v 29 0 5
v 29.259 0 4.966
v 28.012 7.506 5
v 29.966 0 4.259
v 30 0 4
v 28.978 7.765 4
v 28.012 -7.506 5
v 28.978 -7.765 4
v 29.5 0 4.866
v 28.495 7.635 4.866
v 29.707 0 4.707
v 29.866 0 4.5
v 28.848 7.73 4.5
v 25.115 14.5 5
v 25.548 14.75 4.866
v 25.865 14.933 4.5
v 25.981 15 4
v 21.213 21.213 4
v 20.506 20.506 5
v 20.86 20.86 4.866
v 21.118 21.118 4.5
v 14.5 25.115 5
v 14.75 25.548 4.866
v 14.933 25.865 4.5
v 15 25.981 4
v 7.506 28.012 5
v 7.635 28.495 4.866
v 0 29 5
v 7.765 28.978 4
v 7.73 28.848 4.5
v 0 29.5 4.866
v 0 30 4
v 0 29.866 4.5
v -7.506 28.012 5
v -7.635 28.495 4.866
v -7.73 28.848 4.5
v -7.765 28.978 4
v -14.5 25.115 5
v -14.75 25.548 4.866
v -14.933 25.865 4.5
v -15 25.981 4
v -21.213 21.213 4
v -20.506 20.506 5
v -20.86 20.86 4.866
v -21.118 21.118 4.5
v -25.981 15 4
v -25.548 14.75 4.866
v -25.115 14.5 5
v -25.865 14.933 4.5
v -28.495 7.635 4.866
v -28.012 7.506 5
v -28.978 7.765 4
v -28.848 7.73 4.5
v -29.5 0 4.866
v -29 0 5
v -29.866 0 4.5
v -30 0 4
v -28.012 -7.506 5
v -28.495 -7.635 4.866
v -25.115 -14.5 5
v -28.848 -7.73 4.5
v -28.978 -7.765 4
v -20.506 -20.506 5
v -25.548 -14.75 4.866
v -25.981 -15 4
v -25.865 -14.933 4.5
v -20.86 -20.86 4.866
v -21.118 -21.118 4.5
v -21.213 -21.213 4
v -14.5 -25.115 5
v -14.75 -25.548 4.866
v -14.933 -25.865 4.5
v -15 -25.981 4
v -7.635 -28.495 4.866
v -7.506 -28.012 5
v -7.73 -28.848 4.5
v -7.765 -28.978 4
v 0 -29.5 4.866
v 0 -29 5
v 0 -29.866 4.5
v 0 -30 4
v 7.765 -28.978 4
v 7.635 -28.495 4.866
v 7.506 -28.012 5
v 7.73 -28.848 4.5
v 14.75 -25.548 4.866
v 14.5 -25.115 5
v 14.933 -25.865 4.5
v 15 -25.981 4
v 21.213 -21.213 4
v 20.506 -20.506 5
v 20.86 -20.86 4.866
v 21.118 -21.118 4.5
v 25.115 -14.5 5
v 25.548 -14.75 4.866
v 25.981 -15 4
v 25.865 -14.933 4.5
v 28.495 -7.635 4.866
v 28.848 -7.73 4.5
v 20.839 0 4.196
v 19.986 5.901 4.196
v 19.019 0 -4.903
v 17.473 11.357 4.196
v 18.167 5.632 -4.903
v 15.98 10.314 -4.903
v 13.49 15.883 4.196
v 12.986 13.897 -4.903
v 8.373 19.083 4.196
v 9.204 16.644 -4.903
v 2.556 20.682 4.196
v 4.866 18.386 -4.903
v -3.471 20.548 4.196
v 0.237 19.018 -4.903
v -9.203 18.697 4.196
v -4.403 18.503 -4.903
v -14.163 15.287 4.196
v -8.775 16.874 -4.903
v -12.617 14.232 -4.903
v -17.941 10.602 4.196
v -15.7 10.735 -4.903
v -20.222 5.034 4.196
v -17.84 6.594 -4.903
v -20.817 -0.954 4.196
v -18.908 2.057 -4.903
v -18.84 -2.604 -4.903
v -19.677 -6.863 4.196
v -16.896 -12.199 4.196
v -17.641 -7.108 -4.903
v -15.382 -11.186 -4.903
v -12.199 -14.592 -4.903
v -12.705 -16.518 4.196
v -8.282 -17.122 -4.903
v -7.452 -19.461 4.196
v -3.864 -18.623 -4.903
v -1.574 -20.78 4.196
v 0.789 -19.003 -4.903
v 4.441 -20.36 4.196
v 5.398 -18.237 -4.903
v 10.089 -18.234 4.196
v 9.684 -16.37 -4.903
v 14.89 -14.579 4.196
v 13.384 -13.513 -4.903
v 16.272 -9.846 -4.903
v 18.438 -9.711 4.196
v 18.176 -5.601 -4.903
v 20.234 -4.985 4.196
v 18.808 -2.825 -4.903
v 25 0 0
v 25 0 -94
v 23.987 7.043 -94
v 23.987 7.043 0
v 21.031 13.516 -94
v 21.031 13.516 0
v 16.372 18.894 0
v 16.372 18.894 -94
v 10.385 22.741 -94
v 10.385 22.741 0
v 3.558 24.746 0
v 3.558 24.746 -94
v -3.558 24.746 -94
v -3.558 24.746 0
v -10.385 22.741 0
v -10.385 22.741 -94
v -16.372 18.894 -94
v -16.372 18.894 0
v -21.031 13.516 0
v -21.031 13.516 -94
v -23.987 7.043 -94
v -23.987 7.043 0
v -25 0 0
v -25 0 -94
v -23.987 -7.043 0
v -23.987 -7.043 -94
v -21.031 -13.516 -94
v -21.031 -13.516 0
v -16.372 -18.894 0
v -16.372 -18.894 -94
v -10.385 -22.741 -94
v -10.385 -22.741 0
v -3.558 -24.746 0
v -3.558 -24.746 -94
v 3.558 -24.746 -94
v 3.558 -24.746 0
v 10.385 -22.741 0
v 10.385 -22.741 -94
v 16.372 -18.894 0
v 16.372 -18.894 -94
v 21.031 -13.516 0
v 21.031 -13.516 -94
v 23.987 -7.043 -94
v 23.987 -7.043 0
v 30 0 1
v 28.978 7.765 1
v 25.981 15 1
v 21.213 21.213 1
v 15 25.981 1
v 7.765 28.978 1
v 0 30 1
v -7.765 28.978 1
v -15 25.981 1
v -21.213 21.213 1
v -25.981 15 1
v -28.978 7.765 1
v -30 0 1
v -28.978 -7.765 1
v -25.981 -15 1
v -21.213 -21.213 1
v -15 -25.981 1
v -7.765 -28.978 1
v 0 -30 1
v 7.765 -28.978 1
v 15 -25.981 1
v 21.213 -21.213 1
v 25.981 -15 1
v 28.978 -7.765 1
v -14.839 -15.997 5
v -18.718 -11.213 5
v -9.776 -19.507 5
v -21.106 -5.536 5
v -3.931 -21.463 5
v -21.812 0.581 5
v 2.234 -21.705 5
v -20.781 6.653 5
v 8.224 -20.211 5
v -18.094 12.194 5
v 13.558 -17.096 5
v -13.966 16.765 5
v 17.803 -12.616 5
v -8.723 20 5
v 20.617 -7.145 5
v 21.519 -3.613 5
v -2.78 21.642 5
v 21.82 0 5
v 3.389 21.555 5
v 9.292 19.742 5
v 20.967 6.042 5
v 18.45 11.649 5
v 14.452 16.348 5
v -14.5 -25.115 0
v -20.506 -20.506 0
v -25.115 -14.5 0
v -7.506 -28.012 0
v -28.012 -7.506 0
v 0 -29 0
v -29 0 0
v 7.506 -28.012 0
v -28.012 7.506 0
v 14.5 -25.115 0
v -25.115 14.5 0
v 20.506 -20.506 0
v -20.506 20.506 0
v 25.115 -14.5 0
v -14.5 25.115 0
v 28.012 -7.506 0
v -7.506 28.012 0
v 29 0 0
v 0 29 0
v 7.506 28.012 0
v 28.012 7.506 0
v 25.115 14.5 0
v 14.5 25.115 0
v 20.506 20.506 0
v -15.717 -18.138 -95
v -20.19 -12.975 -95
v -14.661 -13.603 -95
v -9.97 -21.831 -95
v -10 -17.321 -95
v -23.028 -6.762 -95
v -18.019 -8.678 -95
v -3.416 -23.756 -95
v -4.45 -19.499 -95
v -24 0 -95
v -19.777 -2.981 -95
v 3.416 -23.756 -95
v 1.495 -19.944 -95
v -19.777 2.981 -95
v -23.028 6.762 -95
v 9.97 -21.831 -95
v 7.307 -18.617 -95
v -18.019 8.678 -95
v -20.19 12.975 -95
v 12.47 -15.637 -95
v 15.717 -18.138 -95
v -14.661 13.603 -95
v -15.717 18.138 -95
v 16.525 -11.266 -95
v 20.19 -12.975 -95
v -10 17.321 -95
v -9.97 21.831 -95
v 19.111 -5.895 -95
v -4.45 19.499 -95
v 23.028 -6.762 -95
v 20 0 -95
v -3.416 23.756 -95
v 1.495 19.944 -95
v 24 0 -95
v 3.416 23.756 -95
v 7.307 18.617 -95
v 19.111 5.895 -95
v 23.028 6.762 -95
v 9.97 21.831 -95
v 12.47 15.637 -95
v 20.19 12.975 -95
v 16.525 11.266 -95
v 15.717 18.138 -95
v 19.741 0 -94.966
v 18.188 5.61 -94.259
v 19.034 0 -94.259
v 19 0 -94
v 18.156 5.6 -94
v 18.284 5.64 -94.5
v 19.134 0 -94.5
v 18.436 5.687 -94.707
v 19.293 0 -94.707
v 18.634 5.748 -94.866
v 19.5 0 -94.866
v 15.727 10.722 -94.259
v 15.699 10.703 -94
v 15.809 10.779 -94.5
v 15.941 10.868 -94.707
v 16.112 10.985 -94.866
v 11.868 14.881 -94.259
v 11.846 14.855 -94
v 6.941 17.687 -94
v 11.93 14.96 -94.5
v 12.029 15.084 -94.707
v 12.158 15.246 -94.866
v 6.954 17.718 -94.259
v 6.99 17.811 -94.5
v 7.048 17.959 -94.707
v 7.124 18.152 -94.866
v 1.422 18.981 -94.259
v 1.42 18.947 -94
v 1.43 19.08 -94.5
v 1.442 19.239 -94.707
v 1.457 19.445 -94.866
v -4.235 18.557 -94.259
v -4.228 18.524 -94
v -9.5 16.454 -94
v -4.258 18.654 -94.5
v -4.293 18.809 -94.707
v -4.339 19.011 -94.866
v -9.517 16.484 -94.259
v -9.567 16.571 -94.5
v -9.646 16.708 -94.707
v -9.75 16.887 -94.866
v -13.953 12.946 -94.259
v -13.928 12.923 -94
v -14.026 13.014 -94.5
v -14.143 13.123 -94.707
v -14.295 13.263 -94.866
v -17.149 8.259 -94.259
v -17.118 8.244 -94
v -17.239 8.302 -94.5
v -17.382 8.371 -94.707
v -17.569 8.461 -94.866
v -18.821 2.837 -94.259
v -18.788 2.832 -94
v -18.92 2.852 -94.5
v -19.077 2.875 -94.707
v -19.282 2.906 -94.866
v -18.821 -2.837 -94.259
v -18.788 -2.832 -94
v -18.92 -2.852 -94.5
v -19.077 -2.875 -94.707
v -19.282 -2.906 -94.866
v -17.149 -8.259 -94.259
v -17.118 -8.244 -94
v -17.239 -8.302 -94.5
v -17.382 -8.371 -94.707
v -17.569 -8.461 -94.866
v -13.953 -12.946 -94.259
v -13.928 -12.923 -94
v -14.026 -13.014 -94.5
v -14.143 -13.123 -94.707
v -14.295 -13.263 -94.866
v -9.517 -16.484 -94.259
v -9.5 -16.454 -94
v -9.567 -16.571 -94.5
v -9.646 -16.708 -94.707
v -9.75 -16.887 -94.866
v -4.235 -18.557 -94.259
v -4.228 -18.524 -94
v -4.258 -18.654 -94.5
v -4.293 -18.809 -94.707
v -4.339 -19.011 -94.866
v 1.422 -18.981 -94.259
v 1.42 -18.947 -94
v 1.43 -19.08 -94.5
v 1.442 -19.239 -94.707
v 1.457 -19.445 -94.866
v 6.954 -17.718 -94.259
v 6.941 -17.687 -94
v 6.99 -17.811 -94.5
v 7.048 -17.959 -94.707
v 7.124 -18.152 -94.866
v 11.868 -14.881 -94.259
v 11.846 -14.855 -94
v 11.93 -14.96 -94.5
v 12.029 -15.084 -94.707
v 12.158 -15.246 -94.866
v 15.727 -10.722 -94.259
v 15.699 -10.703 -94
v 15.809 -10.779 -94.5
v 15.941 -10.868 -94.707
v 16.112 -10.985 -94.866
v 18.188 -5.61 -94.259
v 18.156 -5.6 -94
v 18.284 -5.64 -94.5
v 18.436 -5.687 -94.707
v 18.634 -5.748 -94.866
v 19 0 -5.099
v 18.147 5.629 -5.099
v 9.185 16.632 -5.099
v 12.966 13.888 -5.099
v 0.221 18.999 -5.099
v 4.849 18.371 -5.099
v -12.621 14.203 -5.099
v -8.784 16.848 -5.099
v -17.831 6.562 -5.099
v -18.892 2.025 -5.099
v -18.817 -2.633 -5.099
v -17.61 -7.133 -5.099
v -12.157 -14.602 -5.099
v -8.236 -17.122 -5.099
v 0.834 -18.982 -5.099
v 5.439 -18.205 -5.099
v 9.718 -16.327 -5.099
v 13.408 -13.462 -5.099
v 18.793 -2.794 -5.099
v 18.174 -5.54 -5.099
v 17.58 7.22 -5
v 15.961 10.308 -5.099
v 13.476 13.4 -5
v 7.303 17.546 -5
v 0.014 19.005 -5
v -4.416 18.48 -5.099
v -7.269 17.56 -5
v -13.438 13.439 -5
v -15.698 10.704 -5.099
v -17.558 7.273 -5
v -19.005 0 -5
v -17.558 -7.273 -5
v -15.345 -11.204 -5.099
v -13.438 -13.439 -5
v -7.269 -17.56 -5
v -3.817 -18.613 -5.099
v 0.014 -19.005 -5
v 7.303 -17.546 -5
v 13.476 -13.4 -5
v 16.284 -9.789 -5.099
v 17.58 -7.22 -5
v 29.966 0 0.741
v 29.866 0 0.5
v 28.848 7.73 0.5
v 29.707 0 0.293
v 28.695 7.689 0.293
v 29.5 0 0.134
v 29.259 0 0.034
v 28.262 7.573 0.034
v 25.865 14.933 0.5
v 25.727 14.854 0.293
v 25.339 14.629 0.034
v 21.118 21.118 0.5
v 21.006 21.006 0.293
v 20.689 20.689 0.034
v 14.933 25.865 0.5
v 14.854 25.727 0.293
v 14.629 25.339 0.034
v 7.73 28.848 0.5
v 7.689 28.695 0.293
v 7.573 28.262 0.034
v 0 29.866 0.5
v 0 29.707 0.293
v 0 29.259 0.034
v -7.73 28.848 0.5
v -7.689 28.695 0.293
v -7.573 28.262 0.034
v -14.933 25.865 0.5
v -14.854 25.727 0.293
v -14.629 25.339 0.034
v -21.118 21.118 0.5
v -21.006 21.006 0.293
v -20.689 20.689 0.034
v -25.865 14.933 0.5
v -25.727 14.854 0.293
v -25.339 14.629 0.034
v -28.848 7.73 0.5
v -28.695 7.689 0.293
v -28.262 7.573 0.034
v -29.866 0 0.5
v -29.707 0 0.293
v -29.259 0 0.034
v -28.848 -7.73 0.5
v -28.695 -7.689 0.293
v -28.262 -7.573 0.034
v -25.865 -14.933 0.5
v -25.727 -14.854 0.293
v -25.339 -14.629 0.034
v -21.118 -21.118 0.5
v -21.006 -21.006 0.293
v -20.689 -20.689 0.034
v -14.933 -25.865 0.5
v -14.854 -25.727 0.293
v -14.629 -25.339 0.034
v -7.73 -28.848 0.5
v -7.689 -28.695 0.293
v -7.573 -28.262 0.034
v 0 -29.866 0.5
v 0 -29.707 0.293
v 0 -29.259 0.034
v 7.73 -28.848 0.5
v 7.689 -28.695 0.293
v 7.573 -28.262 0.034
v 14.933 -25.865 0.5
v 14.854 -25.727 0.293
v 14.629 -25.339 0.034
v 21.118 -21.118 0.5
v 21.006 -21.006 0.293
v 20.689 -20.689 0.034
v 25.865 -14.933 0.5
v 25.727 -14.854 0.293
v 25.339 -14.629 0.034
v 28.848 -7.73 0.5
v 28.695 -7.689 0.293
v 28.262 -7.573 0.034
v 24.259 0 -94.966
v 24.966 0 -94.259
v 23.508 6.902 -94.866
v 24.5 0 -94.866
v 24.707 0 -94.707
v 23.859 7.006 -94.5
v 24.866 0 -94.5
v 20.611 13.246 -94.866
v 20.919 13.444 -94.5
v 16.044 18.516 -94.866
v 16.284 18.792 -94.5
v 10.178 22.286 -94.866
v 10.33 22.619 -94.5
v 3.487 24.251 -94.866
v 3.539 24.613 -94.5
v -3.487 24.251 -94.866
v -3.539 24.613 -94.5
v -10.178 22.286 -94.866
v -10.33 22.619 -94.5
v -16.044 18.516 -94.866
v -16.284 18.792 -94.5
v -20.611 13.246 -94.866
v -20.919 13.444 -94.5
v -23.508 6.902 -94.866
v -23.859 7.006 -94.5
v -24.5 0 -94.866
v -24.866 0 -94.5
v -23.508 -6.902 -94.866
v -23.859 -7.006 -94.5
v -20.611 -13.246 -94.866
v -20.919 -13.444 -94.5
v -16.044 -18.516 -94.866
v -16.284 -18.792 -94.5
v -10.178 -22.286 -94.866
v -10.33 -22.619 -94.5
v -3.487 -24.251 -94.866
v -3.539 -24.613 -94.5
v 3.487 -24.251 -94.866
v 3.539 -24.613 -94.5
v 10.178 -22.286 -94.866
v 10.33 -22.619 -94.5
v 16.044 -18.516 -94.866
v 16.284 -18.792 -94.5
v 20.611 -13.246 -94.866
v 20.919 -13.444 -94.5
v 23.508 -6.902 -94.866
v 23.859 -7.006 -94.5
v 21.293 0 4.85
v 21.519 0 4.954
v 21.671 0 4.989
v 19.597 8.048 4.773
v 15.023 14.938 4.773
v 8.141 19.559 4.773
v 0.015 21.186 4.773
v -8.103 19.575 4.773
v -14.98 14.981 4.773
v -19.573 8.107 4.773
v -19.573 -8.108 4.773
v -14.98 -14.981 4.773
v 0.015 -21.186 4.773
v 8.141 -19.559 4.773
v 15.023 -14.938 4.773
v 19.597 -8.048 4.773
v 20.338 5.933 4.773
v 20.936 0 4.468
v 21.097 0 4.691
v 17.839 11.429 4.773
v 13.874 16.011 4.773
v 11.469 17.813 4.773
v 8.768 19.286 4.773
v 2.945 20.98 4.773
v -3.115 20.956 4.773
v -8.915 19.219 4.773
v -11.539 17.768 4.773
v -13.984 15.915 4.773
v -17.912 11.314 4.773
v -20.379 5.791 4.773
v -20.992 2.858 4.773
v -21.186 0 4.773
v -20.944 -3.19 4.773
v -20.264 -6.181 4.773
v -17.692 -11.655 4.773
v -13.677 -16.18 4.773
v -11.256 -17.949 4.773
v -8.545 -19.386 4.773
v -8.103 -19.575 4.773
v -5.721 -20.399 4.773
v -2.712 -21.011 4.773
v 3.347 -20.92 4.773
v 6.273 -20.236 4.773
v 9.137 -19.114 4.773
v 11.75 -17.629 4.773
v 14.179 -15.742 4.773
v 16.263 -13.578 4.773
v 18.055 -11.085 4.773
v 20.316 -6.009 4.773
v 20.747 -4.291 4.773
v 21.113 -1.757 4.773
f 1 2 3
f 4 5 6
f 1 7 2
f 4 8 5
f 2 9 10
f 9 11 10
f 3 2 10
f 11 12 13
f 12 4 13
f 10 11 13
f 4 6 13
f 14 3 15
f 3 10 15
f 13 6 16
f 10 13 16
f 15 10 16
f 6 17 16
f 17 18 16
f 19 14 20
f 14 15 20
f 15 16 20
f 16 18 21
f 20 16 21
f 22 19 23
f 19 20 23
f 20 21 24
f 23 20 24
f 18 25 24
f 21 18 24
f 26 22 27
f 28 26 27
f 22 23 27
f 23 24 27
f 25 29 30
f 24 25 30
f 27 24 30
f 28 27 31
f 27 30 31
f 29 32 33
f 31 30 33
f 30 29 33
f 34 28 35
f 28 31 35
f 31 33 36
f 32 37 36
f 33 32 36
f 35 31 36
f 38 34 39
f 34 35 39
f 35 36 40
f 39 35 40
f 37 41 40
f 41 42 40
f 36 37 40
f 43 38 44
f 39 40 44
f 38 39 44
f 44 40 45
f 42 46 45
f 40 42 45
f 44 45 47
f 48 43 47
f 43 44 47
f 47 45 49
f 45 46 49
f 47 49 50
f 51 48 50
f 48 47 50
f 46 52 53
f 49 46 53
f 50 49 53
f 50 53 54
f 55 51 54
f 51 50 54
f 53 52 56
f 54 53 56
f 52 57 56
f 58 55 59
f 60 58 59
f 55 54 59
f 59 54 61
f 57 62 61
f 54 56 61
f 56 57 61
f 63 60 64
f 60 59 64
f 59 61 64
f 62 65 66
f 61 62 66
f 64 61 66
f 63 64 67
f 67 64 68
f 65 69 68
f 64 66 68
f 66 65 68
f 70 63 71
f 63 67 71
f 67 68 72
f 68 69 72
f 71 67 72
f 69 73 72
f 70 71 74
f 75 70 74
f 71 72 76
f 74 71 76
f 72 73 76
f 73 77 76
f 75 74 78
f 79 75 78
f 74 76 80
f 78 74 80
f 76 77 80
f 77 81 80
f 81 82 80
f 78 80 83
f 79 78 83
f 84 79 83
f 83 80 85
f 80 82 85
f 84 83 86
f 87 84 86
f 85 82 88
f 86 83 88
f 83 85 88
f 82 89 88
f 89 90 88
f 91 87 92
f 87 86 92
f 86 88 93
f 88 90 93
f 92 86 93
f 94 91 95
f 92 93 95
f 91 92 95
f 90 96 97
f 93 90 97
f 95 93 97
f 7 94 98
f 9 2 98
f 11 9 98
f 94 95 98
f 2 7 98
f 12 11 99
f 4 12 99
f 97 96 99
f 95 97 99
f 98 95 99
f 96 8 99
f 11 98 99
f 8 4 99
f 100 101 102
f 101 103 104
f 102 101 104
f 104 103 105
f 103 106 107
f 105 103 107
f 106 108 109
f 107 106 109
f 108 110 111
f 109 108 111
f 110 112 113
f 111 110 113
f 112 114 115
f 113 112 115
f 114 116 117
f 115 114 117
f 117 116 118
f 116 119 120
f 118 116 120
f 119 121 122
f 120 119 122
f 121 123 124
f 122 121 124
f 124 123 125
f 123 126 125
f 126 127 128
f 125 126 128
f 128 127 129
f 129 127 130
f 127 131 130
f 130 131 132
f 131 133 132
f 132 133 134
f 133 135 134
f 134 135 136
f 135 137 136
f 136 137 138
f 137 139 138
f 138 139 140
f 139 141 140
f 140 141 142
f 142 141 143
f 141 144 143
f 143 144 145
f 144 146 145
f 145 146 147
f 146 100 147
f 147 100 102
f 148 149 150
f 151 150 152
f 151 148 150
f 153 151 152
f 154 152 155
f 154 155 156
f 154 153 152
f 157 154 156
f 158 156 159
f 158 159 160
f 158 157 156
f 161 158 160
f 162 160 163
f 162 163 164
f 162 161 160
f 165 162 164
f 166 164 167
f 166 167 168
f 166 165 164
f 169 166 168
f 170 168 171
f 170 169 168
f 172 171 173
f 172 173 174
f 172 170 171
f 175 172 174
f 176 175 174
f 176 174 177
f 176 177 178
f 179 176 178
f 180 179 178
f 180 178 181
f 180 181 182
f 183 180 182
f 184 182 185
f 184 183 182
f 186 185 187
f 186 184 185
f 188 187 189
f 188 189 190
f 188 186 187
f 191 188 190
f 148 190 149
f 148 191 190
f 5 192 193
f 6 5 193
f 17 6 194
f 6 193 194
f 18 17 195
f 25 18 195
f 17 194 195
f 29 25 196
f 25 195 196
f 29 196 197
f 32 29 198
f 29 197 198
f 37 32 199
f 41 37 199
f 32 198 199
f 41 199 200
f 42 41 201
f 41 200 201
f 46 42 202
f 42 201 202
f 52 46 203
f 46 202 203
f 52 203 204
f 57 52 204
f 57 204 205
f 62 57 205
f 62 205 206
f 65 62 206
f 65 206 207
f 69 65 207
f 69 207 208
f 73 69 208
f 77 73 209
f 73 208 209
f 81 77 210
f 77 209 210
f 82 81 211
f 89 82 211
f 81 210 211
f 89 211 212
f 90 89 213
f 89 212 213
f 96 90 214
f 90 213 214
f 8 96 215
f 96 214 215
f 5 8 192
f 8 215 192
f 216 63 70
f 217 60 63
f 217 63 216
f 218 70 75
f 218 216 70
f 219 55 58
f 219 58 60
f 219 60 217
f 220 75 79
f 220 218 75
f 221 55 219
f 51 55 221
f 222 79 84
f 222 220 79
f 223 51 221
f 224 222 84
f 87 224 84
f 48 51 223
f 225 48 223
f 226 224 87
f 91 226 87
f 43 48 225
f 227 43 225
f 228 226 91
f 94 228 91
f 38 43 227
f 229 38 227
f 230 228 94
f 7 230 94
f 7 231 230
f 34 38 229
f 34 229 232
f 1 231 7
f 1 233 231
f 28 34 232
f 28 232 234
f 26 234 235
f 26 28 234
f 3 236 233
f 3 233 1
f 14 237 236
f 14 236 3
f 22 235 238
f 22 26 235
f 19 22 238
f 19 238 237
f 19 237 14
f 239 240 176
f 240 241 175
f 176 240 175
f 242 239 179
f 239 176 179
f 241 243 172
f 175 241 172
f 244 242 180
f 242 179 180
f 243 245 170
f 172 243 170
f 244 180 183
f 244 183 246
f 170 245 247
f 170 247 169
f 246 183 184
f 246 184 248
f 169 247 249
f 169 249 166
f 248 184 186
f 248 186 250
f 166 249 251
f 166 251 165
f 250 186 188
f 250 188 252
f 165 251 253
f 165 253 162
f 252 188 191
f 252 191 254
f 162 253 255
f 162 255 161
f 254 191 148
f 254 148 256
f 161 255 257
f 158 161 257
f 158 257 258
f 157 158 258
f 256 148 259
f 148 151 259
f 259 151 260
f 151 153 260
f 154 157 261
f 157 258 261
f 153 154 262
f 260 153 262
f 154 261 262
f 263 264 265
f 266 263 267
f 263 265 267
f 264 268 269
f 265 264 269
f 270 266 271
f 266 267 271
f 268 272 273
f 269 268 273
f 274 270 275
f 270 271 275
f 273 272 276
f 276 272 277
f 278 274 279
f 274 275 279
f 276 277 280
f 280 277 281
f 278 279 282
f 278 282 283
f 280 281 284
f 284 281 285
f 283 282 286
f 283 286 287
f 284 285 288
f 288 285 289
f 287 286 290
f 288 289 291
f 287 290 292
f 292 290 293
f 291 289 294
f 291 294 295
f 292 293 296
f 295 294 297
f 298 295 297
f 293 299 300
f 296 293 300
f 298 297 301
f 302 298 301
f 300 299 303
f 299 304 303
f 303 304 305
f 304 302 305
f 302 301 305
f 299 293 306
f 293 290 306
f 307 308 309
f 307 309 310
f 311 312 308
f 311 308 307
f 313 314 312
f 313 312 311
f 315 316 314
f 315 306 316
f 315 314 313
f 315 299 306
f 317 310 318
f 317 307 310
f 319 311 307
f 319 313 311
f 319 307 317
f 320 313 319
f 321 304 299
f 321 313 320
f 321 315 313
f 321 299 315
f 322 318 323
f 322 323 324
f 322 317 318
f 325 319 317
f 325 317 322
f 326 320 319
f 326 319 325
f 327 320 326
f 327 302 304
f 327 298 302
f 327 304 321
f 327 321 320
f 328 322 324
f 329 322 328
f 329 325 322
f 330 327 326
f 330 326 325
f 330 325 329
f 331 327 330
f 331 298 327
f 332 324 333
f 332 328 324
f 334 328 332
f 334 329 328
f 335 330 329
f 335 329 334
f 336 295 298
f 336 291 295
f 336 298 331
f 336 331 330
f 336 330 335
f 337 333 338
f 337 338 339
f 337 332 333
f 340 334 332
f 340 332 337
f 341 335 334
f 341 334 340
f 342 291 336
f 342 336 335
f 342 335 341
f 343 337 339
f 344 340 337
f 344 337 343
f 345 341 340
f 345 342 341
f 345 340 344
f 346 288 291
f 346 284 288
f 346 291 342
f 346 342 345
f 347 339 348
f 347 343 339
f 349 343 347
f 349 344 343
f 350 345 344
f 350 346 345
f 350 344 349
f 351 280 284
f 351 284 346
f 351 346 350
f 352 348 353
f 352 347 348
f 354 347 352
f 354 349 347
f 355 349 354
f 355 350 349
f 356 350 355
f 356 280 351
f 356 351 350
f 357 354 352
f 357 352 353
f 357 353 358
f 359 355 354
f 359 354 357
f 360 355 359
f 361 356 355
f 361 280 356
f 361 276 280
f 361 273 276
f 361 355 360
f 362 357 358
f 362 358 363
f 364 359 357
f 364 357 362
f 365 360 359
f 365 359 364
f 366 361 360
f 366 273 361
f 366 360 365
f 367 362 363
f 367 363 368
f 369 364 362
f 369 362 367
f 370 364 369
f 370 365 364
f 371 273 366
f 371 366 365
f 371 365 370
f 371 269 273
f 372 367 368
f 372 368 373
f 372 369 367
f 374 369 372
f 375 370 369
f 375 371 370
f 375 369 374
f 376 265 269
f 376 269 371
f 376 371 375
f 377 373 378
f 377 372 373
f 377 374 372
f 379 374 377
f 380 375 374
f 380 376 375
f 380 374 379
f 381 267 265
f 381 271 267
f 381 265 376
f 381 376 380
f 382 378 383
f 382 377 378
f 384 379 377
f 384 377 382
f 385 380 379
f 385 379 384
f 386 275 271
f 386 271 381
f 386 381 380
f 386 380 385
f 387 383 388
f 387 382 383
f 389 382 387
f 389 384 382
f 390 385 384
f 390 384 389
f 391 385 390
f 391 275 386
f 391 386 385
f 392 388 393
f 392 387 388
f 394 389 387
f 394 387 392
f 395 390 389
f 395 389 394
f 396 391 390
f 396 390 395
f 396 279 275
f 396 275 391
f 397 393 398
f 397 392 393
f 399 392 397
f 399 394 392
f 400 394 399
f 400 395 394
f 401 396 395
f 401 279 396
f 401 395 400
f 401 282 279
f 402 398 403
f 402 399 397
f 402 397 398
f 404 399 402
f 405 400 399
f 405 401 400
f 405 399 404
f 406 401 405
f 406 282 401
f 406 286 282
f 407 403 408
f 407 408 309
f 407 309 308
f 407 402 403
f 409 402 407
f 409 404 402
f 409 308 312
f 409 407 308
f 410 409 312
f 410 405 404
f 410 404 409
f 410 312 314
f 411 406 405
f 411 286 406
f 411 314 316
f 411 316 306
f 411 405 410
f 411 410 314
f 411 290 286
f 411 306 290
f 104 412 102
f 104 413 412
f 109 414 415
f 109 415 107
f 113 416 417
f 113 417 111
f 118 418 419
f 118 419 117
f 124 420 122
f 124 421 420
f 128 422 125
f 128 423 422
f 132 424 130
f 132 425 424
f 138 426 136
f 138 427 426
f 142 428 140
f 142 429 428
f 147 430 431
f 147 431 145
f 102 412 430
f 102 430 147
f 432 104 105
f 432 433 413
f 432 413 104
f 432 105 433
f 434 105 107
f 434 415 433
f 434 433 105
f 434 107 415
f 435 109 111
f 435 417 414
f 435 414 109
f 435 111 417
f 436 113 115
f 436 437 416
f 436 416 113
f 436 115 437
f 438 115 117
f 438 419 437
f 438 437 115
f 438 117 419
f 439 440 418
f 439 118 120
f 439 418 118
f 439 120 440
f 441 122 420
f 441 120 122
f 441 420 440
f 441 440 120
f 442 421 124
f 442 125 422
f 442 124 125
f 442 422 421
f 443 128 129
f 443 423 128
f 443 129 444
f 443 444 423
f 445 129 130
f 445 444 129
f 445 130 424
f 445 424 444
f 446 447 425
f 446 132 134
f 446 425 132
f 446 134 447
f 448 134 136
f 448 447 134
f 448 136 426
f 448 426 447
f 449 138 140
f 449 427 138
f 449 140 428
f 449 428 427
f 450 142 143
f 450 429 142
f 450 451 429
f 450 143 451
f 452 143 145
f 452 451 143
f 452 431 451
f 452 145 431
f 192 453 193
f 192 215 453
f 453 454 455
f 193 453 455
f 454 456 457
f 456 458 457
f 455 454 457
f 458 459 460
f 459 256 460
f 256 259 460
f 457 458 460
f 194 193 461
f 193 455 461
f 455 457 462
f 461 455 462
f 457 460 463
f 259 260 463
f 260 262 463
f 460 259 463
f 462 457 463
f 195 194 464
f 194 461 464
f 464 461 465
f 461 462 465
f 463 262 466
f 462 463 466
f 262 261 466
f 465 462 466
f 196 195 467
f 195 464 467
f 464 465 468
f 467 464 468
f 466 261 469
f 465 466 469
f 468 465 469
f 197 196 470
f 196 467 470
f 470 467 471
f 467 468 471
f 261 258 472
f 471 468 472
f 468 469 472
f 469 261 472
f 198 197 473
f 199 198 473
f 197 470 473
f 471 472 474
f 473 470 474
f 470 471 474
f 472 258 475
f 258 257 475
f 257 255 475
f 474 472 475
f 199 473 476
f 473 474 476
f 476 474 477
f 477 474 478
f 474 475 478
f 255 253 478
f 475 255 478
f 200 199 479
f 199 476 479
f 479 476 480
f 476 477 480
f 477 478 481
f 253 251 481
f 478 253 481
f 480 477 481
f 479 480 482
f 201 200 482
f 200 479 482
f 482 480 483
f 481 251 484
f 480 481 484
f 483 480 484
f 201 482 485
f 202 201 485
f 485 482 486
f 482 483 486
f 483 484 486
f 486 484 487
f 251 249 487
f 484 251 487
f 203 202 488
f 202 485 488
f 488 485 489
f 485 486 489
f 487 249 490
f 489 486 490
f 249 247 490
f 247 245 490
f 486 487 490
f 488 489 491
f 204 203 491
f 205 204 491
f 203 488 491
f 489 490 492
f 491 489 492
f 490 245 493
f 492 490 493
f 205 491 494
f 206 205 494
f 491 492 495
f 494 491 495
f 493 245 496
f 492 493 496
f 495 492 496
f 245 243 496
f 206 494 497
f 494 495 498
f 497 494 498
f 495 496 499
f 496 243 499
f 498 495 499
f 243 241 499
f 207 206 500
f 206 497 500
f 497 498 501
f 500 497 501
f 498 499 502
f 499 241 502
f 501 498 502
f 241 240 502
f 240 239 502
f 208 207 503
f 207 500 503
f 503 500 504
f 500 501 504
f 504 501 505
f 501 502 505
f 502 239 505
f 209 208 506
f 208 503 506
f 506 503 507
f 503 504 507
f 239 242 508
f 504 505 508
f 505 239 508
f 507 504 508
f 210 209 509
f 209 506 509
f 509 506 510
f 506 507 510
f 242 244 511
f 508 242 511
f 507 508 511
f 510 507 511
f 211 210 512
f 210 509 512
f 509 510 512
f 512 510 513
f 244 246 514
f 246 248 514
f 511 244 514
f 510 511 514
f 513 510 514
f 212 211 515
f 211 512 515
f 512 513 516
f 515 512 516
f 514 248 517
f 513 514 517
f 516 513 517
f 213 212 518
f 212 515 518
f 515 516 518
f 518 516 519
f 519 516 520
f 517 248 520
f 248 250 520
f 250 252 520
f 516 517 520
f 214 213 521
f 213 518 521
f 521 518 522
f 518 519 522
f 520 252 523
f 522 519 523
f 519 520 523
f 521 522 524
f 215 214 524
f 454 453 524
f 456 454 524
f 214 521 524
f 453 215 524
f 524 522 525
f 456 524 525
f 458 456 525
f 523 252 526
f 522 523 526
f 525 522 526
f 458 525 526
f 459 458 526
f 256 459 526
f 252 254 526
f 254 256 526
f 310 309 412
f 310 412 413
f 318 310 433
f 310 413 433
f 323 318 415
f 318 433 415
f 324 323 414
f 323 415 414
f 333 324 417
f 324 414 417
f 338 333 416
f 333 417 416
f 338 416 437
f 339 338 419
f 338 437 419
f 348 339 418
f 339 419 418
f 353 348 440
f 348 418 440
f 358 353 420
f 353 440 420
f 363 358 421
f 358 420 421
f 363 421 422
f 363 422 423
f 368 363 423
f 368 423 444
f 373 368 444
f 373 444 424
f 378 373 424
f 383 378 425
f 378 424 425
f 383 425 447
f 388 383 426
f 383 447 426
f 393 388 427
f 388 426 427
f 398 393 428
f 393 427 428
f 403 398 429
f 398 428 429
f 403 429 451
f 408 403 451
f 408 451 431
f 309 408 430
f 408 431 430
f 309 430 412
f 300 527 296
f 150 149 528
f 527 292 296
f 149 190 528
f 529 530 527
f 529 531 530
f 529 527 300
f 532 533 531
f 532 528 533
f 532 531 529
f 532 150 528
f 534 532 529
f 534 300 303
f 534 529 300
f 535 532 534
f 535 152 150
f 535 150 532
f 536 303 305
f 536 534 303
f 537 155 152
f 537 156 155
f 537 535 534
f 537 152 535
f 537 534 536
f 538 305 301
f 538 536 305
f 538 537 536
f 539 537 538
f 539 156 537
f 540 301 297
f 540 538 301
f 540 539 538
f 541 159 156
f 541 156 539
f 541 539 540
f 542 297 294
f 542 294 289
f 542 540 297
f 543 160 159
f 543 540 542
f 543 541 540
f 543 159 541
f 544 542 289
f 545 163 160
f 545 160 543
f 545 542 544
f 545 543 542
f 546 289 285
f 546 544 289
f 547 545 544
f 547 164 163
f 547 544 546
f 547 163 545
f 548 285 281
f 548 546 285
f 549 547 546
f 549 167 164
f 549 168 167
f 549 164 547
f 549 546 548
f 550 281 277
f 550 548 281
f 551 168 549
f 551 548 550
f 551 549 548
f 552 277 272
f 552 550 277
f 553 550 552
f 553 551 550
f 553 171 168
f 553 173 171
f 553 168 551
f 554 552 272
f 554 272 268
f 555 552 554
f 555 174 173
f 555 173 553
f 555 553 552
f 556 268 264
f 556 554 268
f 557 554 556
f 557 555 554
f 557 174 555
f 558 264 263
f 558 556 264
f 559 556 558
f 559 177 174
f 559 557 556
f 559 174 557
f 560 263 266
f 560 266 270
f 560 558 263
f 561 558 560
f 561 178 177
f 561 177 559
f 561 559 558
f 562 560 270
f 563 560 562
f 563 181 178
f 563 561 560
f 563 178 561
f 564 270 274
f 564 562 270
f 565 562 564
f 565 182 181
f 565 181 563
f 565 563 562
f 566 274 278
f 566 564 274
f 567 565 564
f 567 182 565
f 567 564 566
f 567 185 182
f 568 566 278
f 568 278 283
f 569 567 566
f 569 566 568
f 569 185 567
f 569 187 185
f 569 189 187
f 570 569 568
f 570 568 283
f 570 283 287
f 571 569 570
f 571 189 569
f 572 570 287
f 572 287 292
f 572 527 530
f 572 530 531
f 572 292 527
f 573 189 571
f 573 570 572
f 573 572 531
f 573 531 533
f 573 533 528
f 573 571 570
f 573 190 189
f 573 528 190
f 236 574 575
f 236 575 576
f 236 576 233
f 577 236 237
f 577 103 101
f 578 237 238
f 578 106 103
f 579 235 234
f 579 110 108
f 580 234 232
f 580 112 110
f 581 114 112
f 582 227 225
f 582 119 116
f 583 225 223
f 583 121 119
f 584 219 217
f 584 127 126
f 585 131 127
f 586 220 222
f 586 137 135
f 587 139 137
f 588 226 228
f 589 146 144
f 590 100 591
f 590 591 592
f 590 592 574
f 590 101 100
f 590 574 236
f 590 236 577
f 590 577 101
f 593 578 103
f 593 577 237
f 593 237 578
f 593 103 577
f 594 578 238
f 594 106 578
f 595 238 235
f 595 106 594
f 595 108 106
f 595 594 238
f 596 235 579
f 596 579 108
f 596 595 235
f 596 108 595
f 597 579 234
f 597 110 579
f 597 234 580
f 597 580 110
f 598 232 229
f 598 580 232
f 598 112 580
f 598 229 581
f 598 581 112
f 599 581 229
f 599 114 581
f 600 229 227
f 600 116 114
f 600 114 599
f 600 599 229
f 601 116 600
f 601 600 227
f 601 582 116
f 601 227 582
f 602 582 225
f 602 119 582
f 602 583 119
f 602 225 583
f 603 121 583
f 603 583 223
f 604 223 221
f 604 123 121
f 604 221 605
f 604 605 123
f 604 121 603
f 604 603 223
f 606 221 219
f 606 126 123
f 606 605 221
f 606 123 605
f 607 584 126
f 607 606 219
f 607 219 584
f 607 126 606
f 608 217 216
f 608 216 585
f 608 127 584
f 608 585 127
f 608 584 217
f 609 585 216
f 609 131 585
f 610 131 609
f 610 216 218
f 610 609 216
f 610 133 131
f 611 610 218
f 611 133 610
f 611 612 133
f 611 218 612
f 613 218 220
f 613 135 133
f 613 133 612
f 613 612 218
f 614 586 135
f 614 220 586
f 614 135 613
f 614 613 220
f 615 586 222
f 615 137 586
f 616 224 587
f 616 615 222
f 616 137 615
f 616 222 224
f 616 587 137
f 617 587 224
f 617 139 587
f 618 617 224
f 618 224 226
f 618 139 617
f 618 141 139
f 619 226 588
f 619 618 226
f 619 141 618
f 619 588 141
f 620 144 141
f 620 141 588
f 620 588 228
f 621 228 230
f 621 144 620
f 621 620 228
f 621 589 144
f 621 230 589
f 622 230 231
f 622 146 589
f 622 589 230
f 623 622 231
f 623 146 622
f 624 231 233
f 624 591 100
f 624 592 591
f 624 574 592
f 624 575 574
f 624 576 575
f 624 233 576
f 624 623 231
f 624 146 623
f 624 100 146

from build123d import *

# Parameters (mm, degrees)
F0_R     = 30
F0_R_2   = 25
F0_R_3   = 19
F2_DEPTH = 5
F3_DEPTH = 95
F4_SIZE2 = 10
F4_SIZE  = 2
F5_R     = 1


with BuildPart() as f2:
    # F0 (on Top) → F2 (new body, through all)
    with BuildSketch(Plane.XY):
        Circle(F0_R)
        Circle(F0_R_2, mode=Mode.SUBTRACT)
        Circle(F0_R_2)
        Circle(F0_R_3, mode=Mode.SUBTRACT)
    extrude(amount=F2_DEPTH)

    # F0 (on Top) → F3 (join, through all)
    with BuildSketch(Plane.XY):
        Circle(F0_R_2)
        Circle(F0_R_3, mode=Mode.SUBTRACT)
    extrude(amount=-F3_DEPTH)

    # F4
    f4_edges = [f2.edges().sort_by_distance(p)[0] for p in [
        (-19, 0, 5),
    ]]
    f4_side = f2.faces().sort_by_distance((-19.848528, 0, 5))[0]
    chamfer(f4_edges, length=F4_SIZE, length2=F4_SIZE2, reference=f4_side)

    # F5
    f5_edges = [f2.edges().sort_by_distance(p)[0] for p in [
        (-30, 0, 5),
        (-30, 0, 0),
        (-25, 0, -95),
        (-19, 0, -95),
        (-21, 0, 5),
        (-19, 0, -5),
    ]]
    fillet(f5_edges, radius=F5_R)


solid = f2.part
